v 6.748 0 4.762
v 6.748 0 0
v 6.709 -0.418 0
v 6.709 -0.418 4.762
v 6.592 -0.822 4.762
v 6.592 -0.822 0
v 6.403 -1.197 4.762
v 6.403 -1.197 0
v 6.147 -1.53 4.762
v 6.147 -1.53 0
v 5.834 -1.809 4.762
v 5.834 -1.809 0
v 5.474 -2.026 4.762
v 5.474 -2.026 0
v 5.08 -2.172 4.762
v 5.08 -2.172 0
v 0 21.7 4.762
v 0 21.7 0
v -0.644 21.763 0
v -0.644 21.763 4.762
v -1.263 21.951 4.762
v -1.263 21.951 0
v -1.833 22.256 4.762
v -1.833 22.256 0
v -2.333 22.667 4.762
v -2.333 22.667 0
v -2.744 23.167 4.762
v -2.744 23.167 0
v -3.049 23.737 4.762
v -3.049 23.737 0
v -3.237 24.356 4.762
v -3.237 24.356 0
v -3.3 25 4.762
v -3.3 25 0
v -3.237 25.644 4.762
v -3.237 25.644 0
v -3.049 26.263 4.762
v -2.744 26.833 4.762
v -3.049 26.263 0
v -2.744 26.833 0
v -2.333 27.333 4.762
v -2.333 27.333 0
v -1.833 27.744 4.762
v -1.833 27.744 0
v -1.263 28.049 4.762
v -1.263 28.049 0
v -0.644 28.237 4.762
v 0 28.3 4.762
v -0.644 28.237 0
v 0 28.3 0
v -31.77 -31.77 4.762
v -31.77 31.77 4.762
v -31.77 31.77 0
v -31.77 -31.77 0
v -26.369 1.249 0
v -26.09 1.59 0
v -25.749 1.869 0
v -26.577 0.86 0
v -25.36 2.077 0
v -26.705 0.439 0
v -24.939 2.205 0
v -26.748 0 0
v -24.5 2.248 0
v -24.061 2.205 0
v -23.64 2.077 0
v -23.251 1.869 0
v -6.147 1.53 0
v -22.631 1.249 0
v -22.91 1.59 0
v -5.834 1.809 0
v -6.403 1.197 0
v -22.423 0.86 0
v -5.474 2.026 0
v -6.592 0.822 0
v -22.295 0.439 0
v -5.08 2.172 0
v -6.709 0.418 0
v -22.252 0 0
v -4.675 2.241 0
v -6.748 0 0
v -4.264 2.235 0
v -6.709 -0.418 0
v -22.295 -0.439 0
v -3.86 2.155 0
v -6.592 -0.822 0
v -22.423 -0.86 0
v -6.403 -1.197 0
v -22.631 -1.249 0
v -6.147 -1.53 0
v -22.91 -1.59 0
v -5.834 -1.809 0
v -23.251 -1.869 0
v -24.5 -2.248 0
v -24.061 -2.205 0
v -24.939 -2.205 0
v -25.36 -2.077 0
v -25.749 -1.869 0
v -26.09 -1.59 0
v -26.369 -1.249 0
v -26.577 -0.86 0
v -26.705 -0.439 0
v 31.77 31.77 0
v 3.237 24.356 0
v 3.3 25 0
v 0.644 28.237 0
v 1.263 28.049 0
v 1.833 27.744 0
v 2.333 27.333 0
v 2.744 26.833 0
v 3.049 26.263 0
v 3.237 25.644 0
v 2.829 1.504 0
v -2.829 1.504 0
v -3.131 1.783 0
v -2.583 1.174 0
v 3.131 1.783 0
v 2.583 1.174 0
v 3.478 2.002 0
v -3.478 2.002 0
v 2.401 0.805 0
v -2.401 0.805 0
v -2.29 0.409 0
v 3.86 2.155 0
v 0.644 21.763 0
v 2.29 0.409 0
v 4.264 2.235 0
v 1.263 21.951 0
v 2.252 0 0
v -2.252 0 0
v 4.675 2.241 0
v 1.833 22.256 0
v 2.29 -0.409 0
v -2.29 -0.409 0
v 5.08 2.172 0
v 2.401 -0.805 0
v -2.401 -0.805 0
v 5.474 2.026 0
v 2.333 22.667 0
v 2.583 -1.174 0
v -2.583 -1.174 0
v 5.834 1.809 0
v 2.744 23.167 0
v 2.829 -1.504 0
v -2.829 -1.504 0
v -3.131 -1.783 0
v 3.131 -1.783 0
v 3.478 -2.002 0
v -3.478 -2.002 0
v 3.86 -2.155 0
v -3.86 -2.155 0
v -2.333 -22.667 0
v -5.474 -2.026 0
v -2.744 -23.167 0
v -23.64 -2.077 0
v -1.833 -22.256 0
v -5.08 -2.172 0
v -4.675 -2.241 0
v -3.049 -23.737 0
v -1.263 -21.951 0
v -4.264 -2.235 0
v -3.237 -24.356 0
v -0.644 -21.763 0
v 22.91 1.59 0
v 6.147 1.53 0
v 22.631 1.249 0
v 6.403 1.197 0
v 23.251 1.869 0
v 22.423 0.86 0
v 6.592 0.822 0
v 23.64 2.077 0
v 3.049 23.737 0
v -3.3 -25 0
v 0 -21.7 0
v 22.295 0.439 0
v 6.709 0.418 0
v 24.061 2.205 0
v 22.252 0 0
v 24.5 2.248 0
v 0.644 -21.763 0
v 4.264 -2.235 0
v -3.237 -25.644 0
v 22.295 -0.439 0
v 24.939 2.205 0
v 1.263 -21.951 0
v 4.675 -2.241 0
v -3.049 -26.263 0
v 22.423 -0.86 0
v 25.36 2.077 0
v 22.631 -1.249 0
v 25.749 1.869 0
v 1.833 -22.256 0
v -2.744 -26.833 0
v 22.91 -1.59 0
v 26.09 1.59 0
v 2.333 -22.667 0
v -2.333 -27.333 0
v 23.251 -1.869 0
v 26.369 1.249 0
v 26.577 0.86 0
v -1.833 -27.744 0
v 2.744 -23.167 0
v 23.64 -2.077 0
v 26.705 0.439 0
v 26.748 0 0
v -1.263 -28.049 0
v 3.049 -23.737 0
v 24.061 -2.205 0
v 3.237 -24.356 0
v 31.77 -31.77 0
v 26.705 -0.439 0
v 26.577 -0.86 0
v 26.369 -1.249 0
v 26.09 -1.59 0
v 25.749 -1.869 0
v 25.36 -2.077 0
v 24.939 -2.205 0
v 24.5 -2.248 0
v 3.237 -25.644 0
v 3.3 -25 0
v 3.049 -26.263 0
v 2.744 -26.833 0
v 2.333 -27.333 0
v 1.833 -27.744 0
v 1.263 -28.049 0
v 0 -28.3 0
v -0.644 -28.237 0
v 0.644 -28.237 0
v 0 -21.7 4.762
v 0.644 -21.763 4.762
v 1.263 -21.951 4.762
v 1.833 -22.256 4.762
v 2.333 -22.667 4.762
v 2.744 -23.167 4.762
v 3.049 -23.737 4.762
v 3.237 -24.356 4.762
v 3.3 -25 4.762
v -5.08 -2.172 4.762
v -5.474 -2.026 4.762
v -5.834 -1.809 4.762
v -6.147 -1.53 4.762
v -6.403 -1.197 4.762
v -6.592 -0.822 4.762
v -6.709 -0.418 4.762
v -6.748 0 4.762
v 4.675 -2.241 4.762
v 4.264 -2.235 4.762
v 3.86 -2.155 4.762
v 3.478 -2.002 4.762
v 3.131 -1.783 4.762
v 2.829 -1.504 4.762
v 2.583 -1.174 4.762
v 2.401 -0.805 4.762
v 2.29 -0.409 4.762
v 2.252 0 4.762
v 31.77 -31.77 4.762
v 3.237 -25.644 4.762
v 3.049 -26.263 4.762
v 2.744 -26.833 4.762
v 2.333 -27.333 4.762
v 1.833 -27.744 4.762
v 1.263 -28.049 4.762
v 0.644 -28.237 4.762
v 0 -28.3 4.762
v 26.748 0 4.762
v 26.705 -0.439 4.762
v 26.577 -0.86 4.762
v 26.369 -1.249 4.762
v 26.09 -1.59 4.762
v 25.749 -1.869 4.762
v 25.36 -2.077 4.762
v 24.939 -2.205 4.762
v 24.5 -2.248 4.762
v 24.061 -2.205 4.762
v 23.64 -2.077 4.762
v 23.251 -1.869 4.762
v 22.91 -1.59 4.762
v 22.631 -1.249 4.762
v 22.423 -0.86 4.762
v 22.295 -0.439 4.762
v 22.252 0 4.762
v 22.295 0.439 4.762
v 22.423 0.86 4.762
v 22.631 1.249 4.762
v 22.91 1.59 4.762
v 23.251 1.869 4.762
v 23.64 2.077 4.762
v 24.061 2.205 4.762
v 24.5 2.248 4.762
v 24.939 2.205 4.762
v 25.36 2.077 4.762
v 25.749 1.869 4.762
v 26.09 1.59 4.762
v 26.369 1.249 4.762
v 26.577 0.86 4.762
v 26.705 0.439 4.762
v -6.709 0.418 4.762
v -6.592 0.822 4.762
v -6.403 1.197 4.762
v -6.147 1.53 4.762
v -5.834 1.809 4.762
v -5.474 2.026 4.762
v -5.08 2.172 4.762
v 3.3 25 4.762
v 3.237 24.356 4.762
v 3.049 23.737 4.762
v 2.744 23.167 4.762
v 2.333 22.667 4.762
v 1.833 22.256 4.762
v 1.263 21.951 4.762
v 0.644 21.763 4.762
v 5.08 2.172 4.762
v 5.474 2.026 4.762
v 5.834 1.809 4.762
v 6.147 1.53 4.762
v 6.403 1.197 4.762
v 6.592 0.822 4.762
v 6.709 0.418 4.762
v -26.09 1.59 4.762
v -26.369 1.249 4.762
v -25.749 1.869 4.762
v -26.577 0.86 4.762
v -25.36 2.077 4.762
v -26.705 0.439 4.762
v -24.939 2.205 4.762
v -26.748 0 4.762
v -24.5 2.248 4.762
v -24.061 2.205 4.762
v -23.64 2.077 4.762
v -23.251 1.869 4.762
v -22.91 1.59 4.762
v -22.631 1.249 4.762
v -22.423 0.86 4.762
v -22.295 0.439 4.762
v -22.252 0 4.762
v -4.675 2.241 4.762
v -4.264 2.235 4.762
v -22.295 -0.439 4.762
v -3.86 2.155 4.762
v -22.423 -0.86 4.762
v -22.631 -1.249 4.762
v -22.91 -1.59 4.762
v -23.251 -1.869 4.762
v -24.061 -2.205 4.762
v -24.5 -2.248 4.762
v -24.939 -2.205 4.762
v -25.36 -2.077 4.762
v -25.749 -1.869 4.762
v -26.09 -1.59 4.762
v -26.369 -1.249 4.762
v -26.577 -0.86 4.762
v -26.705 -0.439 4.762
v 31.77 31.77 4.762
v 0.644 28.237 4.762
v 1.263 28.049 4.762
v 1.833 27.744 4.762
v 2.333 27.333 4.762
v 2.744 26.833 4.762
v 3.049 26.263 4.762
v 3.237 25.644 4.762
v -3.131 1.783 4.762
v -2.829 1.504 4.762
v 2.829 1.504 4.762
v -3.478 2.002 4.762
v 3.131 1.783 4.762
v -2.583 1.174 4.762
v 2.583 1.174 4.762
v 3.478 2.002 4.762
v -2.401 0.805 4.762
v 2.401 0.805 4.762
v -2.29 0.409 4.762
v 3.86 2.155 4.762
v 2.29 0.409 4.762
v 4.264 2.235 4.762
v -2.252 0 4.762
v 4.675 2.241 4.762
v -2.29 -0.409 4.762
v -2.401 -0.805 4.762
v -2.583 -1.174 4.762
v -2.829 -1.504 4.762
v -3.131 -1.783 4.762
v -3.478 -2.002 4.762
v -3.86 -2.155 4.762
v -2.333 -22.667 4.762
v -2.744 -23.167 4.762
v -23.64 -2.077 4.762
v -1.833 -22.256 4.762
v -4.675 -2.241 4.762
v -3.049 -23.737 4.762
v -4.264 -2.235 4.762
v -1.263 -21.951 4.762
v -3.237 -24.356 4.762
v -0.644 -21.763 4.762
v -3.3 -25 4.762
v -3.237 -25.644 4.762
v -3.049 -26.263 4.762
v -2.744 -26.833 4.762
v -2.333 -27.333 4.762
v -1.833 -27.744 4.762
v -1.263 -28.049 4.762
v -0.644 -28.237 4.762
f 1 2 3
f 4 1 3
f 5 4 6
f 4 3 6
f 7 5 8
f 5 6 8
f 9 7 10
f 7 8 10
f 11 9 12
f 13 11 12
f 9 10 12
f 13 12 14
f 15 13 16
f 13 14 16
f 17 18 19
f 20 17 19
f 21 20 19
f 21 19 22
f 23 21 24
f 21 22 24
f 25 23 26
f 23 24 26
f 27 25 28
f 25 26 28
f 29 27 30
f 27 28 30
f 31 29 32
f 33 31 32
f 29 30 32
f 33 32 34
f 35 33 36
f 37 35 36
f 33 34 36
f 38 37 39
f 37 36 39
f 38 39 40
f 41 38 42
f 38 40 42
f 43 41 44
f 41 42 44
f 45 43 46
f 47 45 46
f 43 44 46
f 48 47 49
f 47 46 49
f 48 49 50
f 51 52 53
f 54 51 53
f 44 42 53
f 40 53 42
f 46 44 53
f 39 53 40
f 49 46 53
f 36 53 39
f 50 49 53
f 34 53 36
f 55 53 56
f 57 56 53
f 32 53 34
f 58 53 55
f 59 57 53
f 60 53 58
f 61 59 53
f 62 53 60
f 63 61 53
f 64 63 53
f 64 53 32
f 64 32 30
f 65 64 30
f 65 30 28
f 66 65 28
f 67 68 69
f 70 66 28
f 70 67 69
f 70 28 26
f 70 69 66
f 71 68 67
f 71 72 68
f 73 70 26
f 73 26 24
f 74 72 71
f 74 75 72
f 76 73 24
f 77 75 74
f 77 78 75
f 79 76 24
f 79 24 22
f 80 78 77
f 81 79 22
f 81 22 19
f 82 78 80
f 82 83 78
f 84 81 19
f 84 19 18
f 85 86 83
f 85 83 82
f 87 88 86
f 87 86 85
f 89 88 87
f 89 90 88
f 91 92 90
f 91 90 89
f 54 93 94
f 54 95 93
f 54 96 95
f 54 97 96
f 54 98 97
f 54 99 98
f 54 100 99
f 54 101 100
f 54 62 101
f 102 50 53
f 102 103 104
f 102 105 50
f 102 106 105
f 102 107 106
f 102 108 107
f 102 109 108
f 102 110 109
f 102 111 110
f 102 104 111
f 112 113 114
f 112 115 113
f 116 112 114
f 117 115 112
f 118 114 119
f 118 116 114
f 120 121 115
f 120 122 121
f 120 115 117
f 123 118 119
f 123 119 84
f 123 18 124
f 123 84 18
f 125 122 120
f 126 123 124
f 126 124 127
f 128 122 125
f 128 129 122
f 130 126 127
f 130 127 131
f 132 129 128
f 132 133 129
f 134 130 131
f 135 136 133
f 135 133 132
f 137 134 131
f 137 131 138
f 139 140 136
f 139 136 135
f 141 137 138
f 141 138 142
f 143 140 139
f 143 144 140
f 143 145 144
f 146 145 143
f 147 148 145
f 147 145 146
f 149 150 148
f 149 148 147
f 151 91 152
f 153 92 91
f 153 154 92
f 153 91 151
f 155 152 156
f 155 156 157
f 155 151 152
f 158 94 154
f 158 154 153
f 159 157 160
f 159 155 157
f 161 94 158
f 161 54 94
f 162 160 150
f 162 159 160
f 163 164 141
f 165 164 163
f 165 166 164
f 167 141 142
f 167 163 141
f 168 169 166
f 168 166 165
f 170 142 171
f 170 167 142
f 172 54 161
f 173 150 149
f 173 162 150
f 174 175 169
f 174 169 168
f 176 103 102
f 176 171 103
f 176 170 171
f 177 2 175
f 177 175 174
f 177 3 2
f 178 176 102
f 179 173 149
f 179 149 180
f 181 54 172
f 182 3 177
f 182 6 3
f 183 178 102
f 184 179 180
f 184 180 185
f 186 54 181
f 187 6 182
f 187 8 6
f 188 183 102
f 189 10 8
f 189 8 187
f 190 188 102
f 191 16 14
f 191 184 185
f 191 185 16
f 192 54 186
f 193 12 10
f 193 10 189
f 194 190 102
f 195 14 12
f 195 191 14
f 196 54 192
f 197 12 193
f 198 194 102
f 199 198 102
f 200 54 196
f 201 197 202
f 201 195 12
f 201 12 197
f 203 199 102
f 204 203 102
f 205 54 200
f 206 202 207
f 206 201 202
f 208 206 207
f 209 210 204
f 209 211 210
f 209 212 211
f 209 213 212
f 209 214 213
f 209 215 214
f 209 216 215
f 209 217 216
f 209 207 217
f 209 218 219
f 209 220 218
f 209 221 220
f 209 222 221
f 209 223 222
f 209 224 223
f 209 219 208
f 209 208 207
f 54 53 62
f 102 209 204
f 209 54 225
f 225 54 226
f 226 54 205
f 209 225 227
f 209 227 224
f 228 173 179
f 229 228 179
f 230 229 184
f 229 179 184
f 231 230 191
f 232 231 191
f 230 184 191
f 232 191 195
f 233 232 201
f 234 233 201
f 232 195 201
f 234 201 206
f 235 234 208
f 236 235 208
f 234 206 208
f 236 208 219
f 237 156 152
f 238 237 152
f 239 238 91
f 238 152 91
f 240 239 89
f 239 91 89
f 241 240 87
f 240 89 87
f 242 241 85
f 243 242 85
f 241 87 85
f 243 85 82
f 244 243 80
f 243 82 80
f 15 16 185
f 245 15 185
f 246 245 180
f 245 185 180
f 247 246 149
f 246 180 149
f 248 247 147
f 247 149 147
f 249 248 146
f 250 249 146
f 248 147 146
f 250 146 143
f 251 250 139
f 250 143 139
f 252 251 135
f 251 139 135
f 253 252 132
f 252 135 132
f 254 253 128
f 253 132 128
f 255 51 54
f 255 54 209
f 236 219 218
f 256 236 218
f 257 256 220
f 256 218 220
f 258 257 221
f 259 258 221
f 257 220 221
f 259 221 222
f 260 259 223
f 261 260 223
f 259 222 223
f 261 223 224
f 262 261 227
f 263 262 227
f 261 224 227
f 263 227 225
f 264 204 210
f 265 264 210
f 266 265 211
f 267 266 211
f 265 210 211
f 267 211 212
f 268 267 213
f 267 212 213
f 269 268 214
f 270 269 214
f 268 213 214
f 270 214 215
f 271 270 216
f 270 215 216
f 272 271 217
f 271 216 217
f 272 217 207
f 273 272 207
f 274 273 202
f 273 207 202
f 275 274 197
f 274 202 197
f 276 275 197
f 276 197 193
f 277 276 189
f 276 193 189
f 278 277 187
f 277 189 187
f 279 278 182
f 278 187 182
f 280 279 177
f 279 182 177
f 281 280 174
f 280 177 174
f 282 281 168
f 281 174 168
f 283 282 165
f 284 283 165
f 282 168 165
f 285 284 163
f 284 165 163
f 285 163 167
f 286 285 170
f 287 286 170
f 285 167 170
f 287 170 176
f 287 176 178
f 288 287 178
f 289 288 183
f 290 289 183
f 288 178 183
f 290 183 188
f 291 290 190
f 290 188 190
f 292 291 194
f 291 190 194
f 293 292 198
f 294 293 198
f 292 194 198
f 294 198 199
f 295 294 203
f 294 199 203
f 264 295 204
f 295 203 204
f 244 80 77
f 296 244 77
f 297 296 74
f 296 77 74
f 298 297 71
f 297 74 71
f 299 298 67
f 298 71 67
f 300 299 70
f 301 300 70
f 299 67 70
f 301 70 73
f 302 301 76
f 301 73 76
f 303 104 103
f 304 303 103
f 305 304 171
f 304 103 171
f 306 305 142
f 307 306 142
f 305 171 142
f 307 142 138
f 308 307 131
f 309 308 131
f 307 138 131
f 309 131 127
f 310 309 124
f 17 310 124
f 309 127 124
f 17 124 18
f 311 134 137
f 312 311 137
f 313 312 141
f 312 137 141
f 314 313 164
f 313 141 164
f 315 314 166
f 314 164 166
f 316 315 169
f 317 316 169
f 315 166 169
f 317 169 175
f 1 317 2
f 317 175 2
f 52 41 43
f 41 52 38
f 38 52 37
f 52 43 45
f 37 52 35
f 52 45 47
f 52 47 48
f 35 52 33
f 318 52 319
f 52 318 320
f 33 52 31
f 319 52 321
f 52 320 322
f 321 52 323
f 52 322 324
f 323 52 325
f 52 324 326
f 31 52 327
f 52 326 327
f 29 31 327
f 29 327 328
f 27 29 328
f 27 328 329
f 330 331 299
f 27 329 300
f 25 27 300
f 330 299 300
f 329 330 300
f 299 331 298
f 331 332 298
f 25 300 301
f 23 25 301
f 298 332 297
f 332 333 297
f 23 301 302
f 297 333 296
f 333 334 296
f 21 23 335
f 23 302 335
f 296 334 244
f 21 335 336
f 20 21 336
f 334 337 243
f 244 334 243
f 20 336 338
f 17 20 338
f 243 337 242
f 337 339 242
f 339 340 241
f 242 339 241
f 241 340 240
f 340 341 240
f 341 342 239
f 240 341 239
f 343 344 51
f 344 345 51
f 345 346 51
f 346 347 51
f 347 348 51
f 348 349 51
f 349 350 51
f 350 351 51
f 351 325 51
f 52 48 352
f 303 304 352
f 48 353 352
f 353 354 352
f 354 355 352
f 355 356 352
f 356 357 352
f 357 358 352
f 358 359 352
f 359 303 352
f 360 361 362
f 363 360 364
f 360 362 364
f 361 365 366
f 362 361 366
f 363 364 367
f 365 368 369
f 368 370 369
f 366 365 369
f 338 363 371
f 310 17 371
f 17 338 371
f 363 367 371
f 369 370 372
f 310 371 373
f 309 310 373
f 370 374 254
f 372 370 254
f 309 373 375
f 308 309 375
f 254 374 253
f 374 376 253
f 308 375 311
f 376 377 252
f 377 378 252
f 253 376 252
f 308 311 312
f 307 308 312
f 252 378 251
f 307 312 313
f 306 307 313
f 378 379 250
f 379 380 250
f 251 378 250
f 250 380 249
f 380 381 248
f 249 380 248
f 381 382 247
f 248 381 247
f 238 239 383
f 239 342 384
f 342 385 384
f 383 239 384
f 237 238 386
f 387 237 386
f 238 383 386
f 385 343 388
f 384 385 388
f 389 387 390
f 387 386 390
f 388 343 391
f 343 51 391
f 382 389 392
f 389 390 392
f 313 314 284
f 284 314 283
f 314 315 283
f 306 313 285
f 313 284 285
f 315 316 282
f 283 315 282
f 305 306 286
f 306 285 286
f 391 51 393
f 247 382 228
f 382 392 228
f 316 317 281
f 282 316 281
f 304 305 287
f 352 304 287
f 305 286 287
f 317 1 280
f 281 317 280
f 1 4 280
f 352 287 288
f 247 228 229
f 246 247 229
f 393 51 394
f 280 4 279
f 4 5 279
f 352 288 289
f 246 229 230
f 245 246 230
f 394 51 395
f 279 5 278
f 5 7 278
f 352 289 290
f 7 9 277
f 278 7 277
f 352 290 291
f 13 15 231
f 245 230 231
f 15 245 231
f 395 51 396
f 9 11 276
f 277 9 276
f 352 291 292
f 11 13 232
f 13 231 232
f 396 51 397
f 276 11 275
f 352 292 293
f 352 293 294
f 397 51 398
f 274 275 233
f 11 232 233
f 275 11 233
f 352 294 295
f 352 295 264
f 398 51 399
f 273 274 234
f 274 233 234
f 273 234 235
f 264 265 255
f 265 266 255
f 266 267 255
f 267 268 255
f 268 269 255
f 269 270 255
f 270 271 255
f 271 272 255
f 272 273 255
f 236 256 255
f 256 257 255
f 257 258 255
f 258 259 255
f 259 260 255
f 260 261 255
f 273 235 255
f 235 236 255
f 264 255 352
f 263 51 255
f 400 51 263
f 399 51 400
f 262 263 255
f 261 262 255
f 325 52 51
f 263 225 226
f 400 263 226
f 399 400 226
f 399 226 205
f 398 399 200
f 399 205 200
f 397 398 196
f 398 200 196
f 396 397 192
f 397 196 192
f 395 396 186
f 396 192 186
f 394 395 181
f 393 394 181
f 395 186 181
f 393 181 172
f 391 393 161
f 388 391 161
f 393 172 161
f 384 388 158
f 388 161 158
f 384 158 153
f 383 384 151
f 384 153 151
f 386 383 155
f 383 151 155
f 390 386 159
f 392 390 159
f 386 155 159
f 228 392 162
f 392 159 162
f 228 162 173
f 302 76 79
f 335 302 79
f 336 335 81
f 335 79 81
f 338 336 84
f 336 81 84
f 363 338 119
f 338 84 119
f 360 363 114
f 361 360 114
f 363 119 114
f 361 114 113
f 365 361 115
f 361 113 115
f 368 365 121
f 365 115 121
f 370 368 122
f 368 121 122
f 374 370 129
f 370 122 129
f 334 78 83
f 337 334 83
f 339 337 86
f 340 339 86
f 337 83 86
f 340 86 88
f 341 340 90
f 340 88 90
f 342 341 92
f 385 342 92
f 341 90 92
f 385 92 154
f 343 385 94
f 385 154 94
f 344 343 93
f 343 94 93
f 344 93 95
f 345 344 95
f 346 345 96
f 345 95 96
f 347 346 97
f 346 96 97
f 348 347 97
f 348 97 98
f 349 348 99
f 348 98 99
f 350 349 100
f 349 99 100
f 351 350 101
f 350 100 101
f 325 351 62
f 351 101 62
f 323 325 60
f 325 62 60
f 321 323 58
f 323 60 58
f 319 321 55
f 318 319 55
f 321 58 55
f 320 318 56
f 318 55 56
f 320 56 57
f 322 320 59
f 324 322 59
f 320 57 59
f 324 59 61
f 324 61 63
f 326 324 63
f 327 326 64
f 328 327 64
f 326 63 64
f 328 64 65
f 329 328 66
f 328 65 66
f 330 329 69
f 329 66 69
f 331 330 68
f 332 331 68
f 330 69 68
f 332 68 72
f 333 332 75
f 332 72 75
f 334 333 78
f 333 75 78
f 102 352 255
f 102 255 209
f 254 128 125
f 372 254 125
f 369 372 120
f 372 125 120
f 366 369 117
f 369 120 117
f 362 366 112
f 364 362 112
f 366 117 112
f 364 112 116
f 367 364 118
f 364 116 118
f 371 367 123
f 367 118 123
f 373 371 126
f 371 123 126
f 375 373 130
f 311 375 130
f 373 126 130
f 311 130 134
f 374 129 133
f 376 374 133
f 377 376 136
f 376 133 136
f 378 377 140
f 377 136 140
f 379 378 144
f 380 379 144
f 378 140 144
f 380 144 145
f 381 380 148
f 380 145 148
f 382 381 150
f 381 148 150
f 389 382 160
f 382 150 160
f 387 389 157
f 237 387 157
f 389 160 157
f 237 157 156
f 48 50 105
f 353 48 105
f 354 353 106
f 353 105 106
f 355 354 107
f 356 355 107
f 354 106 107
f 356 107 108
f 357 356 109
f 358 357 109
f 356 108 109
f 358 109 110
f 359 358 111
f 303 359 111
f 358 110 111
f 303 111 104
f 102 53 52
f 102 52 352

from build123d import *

# Parameters (mm, degrees)
SKETCH1_W            = 25.42
SKETCH1_H            = 25.42
BOSS_EXTRUDE5_DEPTH  = 4.7625
SKETCH3_W            = 4.7625
SKETCH3_H            = 61
BOSS_EXTRUDE6_DEPTH  = 1.27
SKETCH4_W            = 4.7625
SKETCH4_H            = 61
BOSS_EXTRUDE9_DEPTH  = 1.27
SKETCH6_W            = 63.54
SKETCH6_H            = 4.7625
BOSS_EXTRUDE10_DEPTH = 1.27
SKETCH7_W            = 63.54
SKETCH7_H            = 4.7625
BOSS_EXTRUDE11_DEPTH = 1.27


with BuildPart() as part:
    # Sketch1 → Boss-Extrude5 (new body)
    with BuildSketch(Plane.XY):
        with BuildLine():
            Line((0, 28.3), (0, 30.5))
            Line((0, 30.5), (-5.08, 30.5))
            Line((-5.08, 30.5), (-5.08, 5.08))
            Line((-5.08, 5.08), (0, 5.08))
            Line((0, 5.08), (0, 21.7))
            ThreePointArc((0, 21.7), (-3.3, 25), (0, 28.3))
        make_face()
        with BuildLine():
            Line((5.08, 30.5), (0, 30.5))
            Line((0, 30.5), (0, 28.3))
            ThreePointArc((0, 28.3), (2.333452378, 27.333452378), (3.3, 25))
            ThreePointArc((3.3, 25), (2.333452378, 22.666547622), (0, 21.7))
            Line((0, 21.7), (0, 5.08))
            Line((0, 5.08), (5.08, 5.08))
            Line((5.08, 5.08), (5.08, 30.5))
        make_face()
        with BuildLine():
            Line((30.5, 5.08), (5.08, 5.08))
            Line((5.08, 5.08), (5.08, 2.171785995))
            ThreePointArc((5.08, 2.171785995), (6.282811882, 1.369173548), (6.7479, 0))
            Line((6.7479, 0), (22.2521, 0))
            ThreePointArc((22.2521, 0), (24.5, 2.2479), (26.7479, 0))
            Line((26.7479, 0), (30.5, 0))
            Line((30.5, 0), (30.5, 5.08))
        make_face()
        with BuildLine():
            Line((22.2521, 0), (6.7479, 0))
            ThreePointArc((6.7479, 0), (6.282811882, -1.369173548), (5.08, -2.171785995))
            Line((5.08, -2.171785995), (5.08, -5.08))
            Line((5.08, -5.08), (30.5, -5.08))
            Line((30.5, -5.08), (30.5, 0))
            Line((30.5, 0), (26.7479, 0))
            ThreePointArc((26.7479, 0), (24.5, -2.2479), (22.2521, 0))
        make_face()
        with BuildLine():
            Line((2.2521, 0), (0, 0))
            Line((0, 0), (0, -5.08))
            Line((0, -5.08), (5.08, -5.08))
            Line((5.08, -5.08), (5.08, -2.171785995))
            ThreePointArc((5.08, -2.171785995), (3.130826452, -1.782811882), (2.2521, 0))
        make_face()
        with BuildLine():
            Line((0, -5.08), (0, 0))
            Line((0, 0), (-2.2521, 0))
            ThreePointArc((-2.2521, 0), (-3.130826452, -1.782811882), (-5.08, -2.171785995))
            Line((-5.08, -2.171785995), (-5.08, -5.08))
            Line((-5.08, -5.08), (0, -5.08))
        make_face()
        with BuildLine():
            Line((5.08, 2.171785995), (5.08, 5.08))
            Line((5.08, 5.08), (0, 5.08))
            Line((0, 5.08), (0, 0))
            Line((0, 0), (2.2521, 0))
            ThreePointArc((2.2521, 0), (3.130826452, 1.782811882), (5.08, 2.171785995))
        make_face()
        with BuildLine():
            Line((0, 5.08), (-5.08, 5.08))
            Line((-5.08, 5.08), (-5.08, 2.171785995))
            ThreePointArc((-5.08, 2.171785995), (-3.130826452, 1.782811882), (-2.2521, 0))
            Line((-2.2521, 0), (0, 0))
            Line((0, 0), (0, 5.08))
        make_face()
        with BuildLine():
            Line((-5.08, 2.171785995), (-5.08, 5.08))
            Line((-5.08, 5.08), (-30.5, 5.08))
            Line((-30.5, 5.08), (-30.5, 0))
            Line((-30.5, 0), (-26.7479, 0))
            ThreePointArc((-26.7479, 0), (-24.5, 2.2479), (-22.2521, 0))
            Line((-22.2521, 0), (-6.7479, 0))
            ThreePointArc((-6.7479, 0), (-6.282811882, 1.369173548), (-5.08, 2.171785995))
        make_face()
        with BuildLine():
            ThreePointArc((-5.08, -2.171785995), (-6.282811882, -1.369173548), (-6.7479, 0))
            Line((-6.7479, 0), (-22.2521, 0))
            ThreePointArc((-22.2521, 0), (-24.5, -2.2479), (-26.7479, 0))
            Line((-26.7479, 0), (-30.5, 0))
            Line((-30.5, 0), (-30.5, -5.08))
            Line((-30.5, -5.08), (-5.08, -5.08))
            Line((-5.08, -5.08), (-5.08, -2.171785995))
        make_face()
        with BuildLine():
            Line((0, -21.7), (0, -5.08))
            Line((0, -5.08), (-5.08, -5.08))
            Line((-5.08, -5.08), (-5.08, -30.5))
            Line((-5.08, -30.5), (0, -30.5))
            Line((0, -30.5), (0, -28.3))
            ThreePointArc((0, -28.3), (-3.3, -25), (0, -21.7))
        make_face()
        with BuildLine():
            Line((5.08, -5.08), (0, -5.08))
            Line((0, -5.08), (0, -21.7))
            ThreePointArc((0, -21.7), (2.333452378, -22.666547622), (3.3, -25))
            ThreePointArc((3.3, -25), (2.333452378, -27.333452378), (0, -28.3))
            Line((0, -28.3), (0, -30.5))
            Line((0, -30.5), (5.08, -30.5))
            Line((5.08, -30.5), (5.08, -5.08))
        make_face()
        with Locations((-17.79, 17.79)):
            Rectangle(SKETCH1_W, SKETCH1_H)
        with Locations((17.79, 17.79)):
            Rectangle(SKETCH1_W, SKETCH1_H)
        with Locations((17.79, -17.79)):
            Rectangle(SKETCH1_W, SKETCH1_H)
        with Locations((-17.79, -17.79)):
            Rectangle(SKETCH1_W, SKETCH1_H)
    extrude(amount=BOSS_EXTRUDE5_DEPTH)

    # Sketch3 → Boss-Extrude6 (add)
    with BuildSketch(Plane.ZY.offset(30.5)):
        with Locations((2.38125, 0)):
            Rectangle(SKETCH3_W, SKETCH3_H)
    extrude(amount=BOSS_EXTRUDE6_DEPTH)

    # Sketch4 → Boss-Extrude9 (add)
    with BuildSketch(Plane(origin=(30.5, 0, 0), x_dir=(0, 0, -1), z_dir=(1, 0, 0))):
        with Locations((-2.38125, 0)):
            Rectangle(SKETCH4_W, SKETCH4_H)
    extrude(amount=BOSS_EXTRUDE9_DEPTH)

    # Sketch6 → Boss-Extrude10 (add)
    with BuildSketch(Plane.XZ.offset(30.5)):
        with Locations((0, 2.38125)):
            Rectangle(SKETCH6_W, SKETCH6_H)
    extrude(amount=BOSS_EXTRUDE10_DEPTH)

    # Sketch7 → Boss-Extrude11 (add)
    with BuildSketch(Plane(origin=(0, 30.5, 0), x_dir=(1, 0, 0), z_dir=(0, 1, 0))):
        with Locations((0, -2.38125)):
            Rectangle(SKETCH7_W, SKETCH7_H)
    extrude(amount=BOSS_EXTRUDE11_DEPTH)


solid = part.part
